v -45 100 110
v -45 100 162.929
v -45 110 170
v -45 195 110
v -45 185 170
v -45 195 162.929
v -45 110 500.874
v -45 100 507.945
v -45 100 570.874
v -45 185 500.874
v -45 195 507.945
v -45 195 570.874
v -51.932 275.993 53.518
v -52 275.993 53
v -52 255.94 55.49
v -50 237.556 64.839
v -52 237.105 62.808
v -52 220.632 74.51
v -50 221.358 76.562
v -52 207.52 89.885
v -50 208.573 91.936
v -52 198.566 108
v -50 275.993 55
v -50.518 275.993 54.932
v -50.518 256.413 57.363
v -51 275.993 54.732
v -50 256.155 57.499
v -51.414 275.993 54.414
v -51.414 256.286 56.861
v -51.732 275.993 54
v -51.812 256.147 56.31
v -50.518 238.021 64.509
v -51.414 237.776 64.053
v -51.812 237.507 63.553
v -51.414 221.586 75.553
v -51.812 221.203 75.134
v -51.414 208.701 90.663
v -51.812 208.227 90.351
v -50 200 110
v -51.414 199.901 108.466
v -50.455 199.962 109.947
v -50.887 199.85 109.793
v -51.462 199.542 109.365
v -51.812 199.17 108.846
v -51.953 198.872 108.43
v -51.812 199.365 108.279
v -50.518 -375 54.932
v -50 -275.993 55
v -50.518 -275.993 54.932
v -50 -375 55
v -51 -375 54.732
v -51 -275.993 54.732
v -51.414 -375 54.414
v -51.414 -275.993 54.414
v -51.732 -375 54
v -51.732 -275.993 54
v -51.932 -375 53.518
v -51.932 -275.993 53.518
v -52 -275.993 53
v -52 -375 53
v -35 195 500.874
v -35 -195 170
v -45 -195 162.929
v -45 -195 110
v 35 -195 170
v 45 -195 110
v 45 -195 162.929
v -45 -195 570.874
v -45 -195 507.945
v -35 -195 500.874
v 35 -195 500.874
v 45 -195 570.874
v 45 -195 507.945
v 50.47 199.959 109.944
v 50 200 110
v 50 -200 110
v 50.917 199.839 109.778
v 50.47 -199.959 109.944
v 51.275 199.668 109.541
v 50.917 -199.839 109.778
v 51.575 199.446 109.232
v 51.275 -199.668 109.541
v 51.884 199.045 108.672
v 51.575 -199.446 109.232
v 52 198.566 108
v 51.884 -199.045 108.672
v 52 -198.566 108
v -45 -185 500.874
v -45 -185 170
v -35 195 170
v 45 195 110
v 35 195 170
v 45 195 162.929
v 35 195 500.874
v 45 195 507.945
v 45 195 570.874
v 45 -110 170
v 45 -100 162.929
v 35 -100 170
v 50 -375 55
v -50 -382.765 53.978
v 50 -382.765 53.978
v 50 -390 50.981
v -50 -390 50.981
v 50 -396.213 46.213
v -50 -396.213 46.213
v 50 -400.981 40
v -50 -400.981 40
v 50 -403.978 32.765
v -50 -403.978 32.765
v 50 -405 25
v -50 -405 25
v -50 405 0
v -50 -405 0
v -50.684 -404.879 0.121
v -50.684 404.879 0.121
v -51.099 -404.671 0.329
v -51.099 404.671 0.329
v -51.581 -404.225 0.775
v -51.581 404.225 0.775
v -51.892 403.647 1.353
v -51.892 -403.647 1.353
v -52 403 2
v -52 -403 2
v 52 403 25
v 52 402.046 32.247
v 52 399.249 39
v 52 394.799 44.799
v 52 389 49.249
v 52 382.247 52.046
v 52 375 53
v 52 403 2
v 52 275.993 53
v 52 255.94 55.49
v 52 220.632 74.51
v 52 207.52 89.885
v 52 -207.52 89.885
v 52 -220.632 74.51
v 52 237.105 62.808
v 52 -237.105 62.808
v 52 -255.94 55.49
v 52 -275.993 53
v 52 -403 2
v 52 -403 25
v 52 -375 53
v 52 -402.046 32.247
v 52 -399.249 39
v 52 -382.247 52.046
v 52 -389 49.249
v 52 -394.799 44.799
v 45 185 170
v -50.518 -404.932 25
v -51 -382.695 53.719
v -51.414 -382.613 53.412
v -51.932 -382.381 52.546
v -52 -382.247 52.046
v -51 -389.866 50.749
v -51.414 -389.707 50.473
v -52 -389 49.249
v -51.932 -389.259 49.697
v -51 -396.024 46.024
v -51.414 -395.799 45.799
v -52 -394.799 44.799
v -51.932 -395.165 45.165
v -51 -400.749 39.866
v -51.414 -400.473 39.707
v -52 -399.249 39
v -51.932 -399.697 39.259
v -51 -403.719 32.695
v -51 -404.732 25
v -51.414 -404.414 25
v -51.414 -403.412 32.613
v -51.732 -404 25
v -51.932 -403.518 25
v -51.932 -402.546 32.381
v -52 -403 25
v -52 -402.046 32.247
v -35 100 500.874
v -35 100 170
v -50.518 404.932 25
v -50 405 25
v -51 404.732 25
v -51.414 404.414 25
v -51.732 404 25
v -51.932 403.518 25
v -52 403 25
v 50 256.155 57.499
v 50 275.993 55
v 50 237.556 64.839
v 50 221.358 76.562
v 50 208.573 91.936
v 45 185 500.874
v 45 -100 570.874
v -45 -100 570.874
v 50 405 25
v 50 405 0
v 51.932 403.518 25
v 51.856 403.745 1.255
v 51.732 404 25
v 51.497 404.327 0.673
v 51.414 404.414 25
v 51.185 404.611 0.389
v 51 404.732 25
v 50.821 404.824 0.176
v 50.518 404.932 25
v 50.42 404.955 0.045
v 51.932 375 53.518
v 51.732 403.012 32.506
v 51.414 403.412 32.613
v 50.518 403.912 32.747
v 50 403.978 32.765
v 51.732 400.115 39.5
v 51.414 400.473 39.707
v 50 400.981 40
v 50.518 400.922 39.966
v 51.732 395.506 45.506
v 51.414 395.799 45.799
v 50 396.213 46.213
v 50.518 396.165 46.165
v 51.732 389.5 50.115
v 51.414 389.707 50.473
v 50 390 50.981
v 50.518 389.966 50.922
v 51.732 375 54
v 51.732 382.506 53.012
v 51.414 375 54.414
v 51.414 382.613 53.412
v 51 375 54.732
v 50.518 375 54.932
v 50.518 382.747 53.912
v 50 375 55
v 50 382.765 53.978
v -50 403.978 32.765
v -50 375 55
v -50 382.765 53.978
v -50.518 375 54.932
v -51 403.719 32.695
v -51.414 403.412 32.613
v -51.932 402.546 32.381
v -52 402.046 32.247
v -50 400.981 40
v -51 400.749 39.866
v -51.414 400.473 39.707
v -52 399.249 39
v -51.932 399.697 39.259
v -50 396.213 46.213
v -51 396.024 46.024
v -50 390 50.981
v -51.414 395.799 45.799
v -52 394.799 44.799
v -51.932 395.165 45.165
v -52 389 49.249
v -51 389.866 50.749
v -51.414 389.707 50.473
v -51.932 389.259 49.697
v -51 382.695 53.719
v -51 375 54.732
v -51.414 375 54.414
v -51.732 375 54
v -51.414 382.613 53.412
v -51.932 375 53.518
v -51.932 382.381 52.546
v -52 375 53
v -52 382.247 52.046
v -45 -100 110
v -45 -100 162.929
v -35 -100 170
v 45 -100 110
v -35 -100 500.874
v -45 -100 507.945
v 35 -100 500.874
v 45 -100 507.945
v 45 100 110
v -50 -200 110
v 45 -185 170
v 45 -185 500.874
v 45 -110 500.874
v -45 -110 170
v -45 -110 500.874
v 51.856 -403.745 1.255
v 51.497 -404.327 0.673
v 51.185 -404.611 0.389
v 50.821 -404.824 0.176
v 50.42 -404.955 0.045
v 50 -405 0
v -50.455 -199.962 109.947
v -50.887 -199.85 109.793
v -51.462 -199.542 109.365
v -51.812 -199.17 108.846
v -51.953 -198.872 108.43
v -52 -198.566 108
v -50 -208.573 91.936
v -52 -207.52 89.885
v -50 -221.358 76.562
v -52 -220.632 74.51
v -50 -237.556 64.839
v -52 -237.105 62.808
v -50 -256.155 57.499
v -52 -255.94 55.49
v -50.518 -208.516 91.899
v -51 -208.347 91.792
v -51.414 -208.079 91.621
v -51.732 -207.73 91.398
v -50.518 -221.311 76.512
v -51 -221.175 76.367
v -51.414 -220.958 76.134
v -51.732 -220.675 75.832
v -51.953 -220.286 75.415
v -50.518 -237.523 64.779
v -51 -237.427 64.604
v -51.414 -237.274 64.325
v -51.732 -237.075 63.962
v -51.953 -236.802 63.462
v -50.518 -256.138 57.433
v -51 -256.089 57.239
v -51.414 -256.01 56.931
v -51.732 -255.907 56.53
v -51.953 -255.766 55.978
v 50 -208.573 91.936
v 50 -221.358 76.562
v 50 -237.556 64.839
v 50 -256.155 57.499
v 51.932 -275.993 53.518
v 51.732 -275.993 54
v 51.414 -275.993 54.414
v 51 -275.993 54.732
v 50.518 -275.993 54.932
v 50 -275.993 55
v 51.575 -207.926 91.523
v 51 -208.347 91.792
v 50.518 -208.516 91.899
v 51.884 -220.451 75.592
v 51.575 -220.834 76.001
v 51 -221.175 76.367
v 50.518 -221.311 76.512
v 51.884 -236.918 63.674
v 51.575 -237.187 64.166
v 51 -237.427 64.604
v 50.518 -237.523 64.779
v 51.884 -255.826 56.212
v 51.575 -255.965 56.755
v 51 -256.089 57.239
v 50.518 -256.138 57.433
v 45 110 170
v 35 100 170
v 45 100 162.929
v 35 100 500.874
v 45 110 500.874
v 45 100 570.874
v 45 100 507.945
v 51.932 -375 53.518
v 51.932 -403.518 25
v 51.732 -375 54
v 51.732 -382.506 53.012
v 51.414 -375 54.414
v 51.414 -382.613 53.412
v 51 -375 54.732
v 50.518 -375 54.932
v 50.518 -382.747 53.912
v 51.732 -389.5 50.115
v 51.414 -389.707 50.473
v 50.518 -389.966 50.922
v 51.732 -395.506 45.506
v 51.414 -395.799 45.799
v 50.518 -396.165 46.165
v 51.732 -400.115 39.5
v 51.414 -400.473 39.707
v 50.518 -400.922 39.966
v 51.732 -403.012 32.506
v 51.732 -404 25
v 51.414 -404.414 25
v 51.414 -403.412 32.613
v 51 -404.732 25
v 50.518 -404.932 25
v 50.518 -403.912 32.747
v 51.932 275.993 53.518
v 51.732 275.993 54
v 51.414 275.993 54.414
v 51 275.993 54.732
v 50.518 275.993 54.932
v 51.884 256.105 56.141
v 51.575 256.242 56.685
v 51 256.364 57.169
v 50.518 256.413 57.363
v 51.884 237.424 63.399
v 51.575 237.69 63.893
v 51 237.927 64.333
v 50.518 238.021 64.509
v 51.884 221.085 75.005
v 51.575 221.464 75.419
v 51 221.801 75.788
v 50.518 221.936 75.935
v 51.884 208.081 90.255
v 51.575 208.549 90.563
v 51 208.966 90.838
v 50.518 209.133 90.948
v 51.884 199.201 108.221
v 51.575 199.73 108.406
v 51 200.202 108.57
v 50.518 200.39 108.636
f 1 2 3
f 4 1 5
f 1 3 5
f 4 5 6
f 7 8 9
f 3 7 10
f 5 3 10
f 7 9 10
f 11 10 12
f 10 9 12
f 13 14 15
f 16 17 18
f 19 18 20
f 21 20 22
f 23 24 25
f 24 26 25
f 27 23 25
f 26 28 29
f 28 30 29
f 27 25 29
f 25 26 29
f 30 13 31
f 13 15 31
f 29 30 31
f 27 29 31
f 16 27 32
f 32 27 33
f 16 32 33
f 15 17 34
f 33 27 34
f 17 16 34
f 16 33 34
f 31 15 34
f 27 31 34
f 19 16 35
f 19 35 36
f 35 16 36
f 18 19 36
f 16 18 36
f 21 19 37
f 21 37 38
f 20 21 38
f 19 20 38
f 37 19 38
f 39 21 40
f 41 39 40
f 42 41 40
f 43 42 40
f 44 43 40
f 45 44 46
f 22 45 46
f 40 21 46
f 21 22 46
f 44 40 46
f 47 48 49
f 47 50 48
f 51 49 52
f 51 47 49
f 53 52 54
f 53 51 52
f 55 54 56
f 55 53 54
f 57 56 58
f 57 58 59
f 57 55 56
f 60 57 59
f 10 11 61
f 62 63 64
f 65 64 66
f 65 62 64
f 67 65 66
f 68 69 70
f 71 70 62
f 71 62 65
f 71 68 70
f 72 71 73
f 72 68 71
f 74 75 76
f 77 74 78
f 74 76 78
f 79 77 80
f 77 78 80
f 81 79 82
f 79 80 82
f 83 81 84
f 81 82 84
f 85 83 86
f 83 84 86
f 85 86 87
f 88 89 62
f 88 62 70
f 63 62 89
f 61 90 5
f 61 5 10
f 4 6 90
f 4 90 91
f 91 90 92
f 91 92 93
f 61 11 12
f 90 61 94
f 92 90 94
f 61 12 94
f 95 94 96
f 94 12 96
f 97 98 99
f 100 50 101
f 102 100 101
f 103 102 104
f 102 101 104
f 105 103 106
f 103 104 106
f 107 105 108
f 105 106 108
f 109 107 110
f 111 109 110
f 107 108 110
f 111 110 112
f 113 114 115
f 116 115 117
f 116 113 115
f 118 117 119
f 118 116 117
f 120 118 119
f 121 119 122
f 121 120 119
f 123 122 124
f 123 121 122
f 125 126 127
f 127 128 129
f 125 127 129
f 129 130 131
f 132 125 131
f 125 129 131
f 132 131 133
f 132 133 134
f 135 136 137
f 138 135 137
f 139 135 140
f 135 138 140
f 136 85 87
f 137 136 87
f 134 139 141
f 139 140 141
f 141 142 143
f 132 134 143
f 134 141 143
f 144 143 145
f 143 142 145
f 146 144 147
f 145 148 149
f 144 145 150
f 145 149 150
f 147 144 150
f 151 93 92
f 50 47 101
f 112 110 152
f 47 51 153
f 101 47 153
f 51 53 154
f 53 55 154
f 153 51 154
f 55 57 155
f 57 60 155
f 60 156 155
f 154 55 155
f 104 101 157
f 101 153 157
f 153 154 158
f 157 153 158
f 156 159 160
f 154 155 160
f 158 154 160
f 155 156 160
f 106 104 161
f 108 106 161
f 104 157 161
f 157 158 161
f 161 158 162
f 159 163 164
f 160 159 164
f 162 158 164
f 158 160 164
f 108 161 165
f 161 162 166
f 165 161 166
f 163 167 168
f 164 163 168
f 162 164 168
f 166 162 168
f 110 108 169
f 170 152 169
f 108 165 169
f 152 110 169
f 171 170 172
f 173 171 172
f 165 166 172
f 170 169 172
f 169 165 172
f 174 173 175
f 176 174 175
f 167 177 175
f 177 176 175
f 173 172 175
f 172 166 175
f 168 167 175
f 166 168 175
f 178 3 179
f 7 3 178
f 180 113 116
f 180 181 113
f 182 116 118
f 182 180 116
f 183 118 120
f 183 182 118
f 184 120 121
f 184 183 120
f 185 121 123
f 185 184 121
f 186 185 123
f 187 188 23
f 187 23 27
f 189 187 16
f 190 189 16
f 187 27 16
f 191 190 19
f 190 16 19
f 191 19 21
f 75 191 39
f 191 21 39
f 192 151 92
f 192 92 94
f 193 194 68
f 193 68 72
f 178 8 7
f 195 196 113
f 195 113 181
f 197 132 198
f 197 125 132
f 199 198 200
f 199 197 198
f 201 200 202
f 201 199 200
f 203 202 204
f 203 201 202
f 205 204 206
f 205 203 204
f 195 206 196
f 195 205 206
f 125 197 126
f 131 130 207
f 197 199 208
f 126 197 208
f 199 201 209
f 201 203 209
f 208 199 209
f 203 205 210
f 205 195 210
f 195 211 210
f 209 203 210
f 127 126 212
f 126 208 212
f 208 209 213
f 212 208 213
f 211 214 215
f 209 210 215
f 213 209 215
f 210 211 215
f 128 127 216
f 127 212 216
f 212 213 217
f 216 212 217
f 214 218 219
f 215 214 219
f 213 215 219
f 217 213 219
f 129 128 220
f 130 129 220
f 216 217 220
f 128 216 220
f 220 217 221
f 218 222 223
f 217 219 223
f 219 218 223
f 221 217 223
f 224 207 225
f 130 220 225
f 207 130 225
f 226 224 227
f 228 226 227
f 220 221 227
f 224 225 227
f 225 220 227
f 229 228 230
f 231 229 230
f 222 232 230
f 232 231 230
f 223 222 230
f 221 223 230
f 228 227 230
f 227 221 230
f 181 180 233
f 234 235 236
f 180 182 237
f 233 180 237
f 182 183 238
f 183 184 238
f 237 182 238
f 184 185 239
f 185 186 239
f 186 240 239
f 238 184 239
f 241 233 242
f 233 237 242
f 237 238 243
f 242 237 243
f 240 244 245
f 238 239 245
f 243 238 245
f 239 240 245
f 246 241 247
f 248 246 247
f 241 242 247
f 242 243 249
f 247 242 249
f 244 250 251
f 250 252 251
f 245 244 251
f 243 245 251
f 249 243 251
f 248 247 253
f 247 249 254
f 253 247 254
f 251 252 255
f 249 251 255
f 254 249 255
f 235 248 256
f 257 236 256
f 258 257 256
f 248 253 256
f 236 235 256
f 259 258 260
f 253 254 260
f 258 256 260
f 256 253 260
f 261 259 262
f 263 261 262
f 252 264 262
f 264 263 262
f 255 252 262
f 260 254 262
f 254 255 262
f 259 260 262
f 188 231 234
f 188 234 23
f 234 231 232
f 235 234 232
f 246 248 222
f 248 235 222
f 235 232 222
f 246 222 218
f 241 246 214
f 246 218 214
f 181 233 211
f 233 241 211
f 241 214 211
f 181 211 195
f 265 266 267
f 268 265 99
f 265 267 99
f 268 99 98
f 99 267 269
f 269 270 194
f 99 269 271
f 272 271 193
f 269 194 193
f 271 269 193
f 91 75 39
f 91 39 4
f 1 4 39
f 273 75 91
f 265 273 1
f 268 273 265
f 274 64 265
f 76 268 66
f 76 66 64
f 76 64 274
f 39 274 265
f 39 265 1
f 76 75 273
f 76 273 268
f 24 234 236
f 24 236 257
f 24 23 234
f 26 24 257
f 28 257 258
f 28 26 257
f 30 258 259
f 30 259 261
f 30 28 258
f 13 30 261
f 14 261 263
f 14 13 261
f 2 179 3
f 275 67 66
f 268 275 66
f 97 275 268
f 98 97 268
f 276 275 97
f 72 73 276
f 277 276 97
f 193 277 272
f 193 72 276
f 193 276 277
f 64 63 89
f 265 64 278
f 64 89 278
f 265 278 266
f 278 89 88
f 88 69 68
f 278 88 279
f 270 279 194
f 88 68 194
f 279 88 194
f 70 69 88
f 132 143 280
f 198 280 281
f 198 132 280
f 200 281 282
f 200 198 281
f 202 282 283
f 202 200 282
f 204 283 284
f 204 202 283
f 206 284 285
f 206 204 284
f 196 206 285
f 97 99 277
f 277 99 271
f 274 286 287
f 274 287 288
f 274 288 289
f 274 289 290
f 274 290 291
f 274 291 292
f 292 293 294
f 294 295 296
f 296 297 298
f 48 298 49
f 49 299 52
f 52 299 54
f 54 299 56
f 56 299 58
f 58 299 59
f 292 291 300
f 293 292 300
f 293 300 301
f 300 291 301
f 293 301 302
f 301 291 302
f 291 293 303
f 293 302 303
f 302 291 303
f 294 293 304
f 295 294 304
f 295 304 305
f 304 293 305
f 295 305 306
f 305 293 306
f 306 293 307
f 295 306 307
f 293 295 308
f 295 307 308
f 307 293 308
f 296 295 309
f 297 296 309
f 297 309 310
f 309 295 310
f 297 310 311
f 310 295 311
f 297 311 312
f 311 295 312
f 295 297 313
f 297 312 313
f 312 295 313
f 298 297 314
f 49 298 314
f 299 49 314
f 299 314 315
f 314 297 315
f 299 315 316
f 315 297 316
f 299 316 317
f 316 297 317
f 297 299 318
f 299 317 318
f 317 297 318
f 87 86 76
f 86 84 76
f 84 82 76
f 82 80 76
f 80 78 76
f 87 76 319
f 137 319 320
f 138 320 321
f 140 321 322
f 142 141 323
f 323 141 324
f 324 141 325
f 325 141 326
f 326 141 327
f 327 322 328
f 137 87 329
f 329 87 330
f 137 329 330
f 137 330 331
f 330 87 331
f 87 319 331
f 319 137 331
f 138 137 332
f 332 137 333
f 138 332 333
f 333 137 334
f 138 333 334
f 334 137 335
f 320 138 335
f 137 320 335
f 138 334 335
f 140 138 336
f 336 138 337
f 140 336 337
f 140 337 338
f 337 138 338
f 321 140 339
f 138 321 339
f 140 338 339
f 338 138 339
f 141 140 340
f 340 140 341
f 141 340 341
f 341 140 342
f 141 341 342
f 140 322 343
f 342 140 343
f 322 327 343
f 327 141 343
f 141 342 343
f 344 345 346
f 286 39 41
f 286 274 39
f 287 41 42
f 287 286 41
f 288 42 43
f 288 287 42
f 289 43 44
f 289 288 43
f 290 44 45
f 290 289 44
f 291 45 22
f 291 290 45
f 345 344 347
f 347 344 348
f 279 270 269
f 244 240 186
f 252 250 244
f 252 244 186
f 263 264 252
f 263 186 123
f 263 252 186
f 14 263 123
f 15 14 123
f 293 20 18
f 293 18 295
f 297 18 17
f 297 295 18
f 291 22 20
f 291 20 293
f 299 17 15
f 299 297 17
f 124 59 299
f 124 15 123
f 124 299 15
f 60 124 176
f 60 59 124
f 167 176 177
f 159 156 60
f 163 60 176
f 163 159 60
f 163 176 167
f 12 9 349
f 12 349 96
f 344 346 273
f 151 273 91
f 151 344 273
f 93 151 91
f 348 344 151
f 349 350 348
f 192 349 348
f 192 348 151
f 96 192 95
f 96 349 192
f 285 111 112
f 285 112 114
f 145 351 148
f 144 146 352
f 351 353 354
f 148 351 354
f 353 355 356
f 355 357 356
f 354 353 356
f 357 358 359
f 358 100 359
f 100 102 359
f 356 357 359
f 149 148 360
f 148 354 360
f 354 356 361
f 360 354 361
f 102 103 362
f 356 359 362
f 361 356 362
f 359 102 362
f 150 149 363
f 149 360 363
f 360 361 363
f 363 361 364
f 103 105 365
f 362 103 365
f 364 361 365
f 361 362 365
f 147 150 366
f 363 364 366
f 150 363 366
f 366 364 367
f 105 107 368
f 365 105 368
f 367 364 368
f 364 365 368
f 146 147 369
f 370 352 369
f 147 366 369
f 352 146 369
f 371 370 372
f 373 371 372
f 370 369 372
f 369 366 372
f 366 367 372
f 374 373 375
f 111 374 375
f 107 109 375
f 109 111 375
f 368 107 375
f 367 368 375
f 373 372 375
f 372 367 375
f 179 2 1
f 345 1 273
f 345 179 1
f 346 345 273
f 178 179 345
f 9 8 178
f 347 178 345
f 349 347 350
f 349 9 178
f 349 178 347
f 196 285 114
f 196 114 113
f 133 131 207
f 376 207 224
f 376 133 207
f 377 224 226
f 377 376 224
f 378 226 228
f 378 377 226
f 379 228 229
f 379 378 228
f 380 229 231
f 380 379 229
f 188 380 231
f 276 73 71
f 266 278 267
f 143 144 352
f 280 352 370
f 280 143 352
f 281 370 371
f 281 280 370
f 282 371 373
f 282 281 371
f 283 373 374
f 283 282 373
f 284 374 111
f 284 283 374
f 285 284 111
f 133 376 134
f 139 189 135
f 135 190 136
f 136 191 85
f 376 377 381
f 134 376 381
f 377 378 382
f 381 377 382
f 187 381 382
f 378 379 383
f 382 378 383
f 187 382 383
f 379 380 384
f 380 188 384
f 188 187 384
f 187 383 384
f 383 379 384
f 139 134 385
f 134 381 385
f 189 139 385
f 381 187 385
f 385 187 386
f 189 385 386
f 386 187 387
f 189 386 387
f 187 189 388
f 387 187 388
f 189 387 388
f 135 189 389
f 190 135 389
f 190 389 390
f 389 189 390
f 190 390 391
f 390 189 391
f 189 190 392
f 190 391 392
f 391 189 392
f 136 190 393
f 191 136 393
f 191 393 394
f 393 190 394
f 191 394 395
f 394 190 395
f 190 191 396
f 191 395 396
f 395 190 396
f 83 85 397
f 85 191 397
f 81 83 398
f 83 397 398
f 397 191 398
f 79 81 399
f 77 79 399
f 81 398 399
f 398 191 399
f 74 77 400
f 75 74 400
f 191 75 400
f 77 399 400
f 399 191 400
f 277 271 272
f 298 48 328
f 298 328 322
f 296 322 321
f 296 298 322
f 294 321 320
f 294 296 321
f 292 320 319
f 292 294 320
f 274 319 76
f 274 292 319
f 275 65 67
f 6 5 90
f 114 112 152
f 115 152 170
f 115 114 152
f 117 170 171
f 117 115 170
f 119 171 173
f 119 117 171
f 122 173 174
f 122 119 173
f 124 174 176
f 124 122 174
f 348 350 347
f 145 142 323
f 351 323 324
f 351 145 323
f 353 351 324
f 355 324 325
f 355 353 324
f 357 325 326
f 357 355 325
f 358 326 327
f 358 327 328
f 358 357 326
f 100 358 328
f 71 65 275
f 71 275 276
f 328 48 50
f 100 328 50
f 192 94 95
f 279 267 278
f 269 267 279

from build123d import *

# Parameters (mm, degrees)
F1_DEPTH      = 52
F1_DEPTH_BACK = 52
F0_W          = 95
F0_H          = 460.873763546
F2_DEPTH      = 45
F2_DEPTH_BACK = 45
F3_R          = 30
F4_T1_DEPTH   = 104
F5_T1_DEPTH   = 104
F6_SIZE       = 10
F7_W          = 90
F7_H          = 95
F8_DEPTH      = 50
F9_W          = 90
F9_H          = 95
F10_DEPTH     = 60
F11_T4_DEPTH  = 65.575795383
F11_T10_DEPTH = 65.575795383
F11_T16_DEPTH = 65.575795383
F11_T22_DEPTH = 65.575795383
F11_T28_DEPTH = 65.575795383
F11_T34_DEPTH = 65.575795383
F11_T40_DEPTH = 65.575795383
F11_T46_DEPTH = 65.575795383
F12_T4_DEPTH  = 65.575795383
F12_T10_DEPTH = 65.575795383
F12_T16_DEPTH = 65.575795383
F12_T22_DEPTH = 65.575795383
F12_T28_DEPTH = 65.575795383
F12_T34_DEPTH = 65.575795383
F12_T40_DEPTH = 65.575795383
F12_T46_DEPTH = 65.575795383
F13_R         = 2


# Not quite as in the source:
# - a fillet or chamfer that OpenCascade refuses, or shapes differently, is made with other operations: its cross-section is extruded or revolved along the edge and cut away or added


with BuildPart() as f1:
    # F0 (on Right) → F1 (new body, two sides)
    with BuildSketch(Plane.YZ) as f1_sk:
        Polygon((-405, 55), (-405, 0), (405, 0), (405, 55), (200, 55), (200, 110), (195, 110), (100, 110), (0, 110), (-100, 110), (-195, 110), (-200, 110), (-200, 55), align=None)
    extrude(amount=F1_DEPTH)
    extrude(f1_sk.sketch, amount=-F1_DEPTH_BACK)

    # F0 (on Right) → F2 (join, two sides)
    with BuildSketch(Plane.YZ) as f2_sk:
        with Locations((-147.5, 340.436881773)):
            Rectangle(F0_W, F0_H)
        with Locations((147.5, 340.436881773)):
            Rectangle(F0_W, F0_H)
    extrude(amount=-F2_DEPTH)
    extrude(f2_sk.sketch, amount=F2_DEPTH_BACK)

    # F3
    f3_edges = [f1.edges().sort_by_distance(p)[0] for p in [
        (0, 405, 55),
        (0, -405, 55),
    ]]
    fillet(f3_edges, radius=F3_R)

    # F4: fillet of radius 80 on 1 edges, made by hand

    # F4_s2 → F4_t1 (join)
    with BuildSketch(Plane.YZ.offset(-52)):
        with BuildLine():
            ThreePointArc((275.9934207679, 55), (229.0892631696, 70.1925930159), (200, 110))
            Line((200, 110), (200, 55))
            Line((200, 55), (275.9934207679, 55))
        make_face()
    extrude(amount=F4_T1_DEPTH)

    # F5: fillet of radius 80 on 1 edges, made by hand

    # F5_s2 → F5_t1 (join)
    with BuildSketch(Plane.YZ.offset(-52)):
        with BuildLine():
            ThreePointArc((-275.9934207679, 55), (-229.0892631696, 70.1925930159), (-200, 110))
            Line((-200, 110), (-200, 55))
            Line((-200, 55), (-275.9934207679, 55))
        make_face()
    extrude(amount=F5_T1_DEPTH)

    # F6
    f6_edges = [f1.edges().sort_by_distance(p)[0] for p in [
        (45, -195, 340.436882),
        (45, -100, 340.436882),
        (45, 100, 340.436882),
        (-45, -195, 340.436882),
        (-45, -100, 340.436882),
        (-45, 100, 340.436882),
        (-45, 195, 340.436882),
        (45, 195, 340.436882),
    ]]
    chamfer(f6_edges, length=F6_SIZE)

    # F7 (on face) → F8 (join)
    with BuildSketch(Plane.XY.offset(110)):
        with Locations((0, -147.5)):
            Rectangle(F7_W, F7_H)
        with Locations((0, 147.5)):
            Rectangle(F7_W, F7_H)
    extrude(amount=F8_DEPTH)

    # F9 (on face) → F10 (join)
    with BuildSketch(Plane.XY.offset(570.873763546)):
        Polygon((45, -110), (45, -100), (35, -100), align=None)
        Polygon((-45, -110), (-35, -100), (-45, -100), align=None)
        Polygon((45, -195), (45, -185), (35, -195), align=None)
        Polygon((-35, -195), (-45, -185), (-45, -195), align=None)
        with Locations((0, 147.5)):
            Rectangle(F9_W, F9_H)
        Polygon((45, -110), (35, -100), (-35, -100), (-45, -110), (-45, -185), (-35, -195), (35, -195), (45, -185), align=None)
    extrude(amount=-F10_DEPTH)

    # F11: chamfer of 10 on 8 edges, made by hand


with BuildPart() as f11_tool2:
    # F11_s3 → F11_t4 (new body)
    with BuildSketch(Plane(origin=(-98.1845447985, -98.1845447985, 0), x_dir=(0, 0, 1), z_dir=(0.7071067812, 0.7071067812, 0))):
        Polygon((510.873763546, 172.6345596729), (500.873763546, 162.6345596729), (510.873763546, 162.6345596729), align=None)
    extrude(amount=F11_T4_DEPTH)

    split(bisect_by=Plane.YZ.offset(45), keep=Keep.BOTTOM)

    split(bisect_by=Plane.XZ.offset(195), keep=Keep.BOTTOM)


with BuildPart() as f1_1:
    add(f1.part)

    # F11_t1: union F11_tool2
    add(f11_tool2.part)


with BuildPart() as f11_tool8:
    # F11_s9 → F11_t10 (new body)
    with BuildSketch(Plane(origin=(49.3154552015, -49.3154552015, 0), x_dir=(0, 0, 1), z_dir=(0.7071067812, -0.7071067812, 0))):
        Polygon((500.873763546, 45.9619407771), (510.873763546, 35.9619407771), (510.873763546, 45.9619407771), align=None)
    extrude(amount=F11_T10_DEPTH)

    split(bisect_by=Plane.YZ.offset(45), keep=Keep.BOTTOM)

    split(bisect_by=Plane.XZ.offset(100), keep=Keep.TOP)


with BuildPart() as f1_2:
    add(f1_1.part)

    # F11_t7: union F11_tool8
    add(f11_tool8.part)


with BuildPart() as f11_tool14:
    # F11_s15 → F11_t16 (new body)
    with BuildSketch(Plane(origin=(-95.6845447985, -95.6845447985, 0), x_dir=(0, 0, 1), z_dir=(0.7071067812, 0.7071067812, 0))):
        Polygon((510.873763546, 35.9619407771), (500.873763546, 45.9619407771), (510.873763546, 45.9619407771), align=None)
    extrude(amount=F11_T16_DEPTH)

    split(bisect_by=Plane.YZ.offset(-45), keep=Keep.TOP)

    split(bisect_by=Plane.XZ.offset(100), keep=Keep.TOP)


with BuildPart() as f1_3:
    add(f1_2.part)

    # F11_t13: union F11_tool14
    add(f11_tool14.part)


with BuildPart() as f11_tool20:
    # F11_s21 → F11_t22 (new body)
    with BuildSketch(Plane(origin=(98.1845447985, -98.1845447985, 0), x_dir=(0, 0, 1), z_dir=(-0.7071067812, 0.7071067812, 0))):
        Polygon((510.873763546, -172.6345596729), (500.873763546, -162.6345596729), (510.873763546, -162.6345596729), align=None)
    extrude(amount=F11_T22_DEPTH)

    split(bisect_by=Plane.XZ.offset(195), keep=Keep.BOTTOM)

    split(bisect_by=Plane.YZ.offset(-45), keep=Keep.TOP)


with BuildPart() as f1_4:
    add(f1_3.part)

    # F11_t19: union F11_tool20
    add(f11_tool20.part)


with BuildPart() as f11_tool26:
    # F11_s27 → F11_t28 (new body)
    with BuildSketch(Plane(origin=(-98.1845447985, 98.1845447985, 0), x_dir=(0, 0, 1), z_dir=(0.7071067812, -0.7071067812, 0))):
        Polygon((500.873763546, -162.6345596729), (510.873763546, -172.6345596729), (510.873763546, -162.6345596729), align=None)
    extrude(amount=F11_T28_DEPTH)

    split(bisect_by=Plane.YZ.offset(45), keep=Keep.BOTTOM)

    split(bisect_by=Plane.XZ.offset(-195), keep=Keep.TOP)


with BuildPart() as f1_5:
    add(f1_4.part)

    # F11_t25: union F11_tool26
    add(f11_tool26.part)


with BuildPart() as f11_tool32:
    # F11_s33 → F11_t34 (new body)
    with BuildSketch(Plane(origin=(49.3154552015, 49.3154552015, 0), x_dir=(0, 0, 1), z_dir=(0.7071067812, 0.7071067812, 0))):
        Polygon((510.873763546, -35.9619407771), (500.873763546, -45.9619407771), (510.873763546, -45.9619407771), align=None)
    extrude(amount=F11_T34_DEPTH)

    split(bisect_by=Plane.YZ.offset(45), keep=Keep.BOTTOM)

    split(bisect_by=Plane.XZ.offset(-100), keep=Keep.BOTTOM)


with BuildPart() as f1_6:
    add(f1_5.part)

    # F11_t31: union F11_tool32
    add(f11_tool32.part)


with BuildPart() as f11_tool38:
    # F11_s39 → F11_t40 (new body)
    with BuildSketch(Plane(origin=(-49.3154552015, 49.3154552015, 0), x_dir=(0, 0, 1), z_dir=(-0.7071067812, 0.7071067812, 0))):
        Polygon((510.873763546, 35.9619407771), (500.873763546, 45.9619407771), (510.873763546, 45.9619407771), align=None)
    extrude(amount=F11_T40_DEPTH)

    split(bisect_by=Plane.XZ.offset(-100), keep=Keep.BOTTOM)

    split(bisect_by=Plane.YZ.offset(-45), keep=Keep.TOP)


with BuildPart() as f1_7:
    add(f1_6.part)

    # F11_t37: union F11_tool38
    add(f11_tool38.part)


with BuildPart() as f11_tool44:
    # F11_s45 → F11_t46 (new body)
    with BuildSketch(Plane(origin=(51.8154552015, 51.8154552015, 0), x_dir=(0, 0, 1), z_dir=(0.7071067812, 0.7071067812, 0))):
        Polygon((510.873763546, -172.6345596729), (500.873763546, -162.6345596729), (510.873763546, -162.6345596729), align=None)
    extrude(amount=F11_T46_DEPTH)

    split(bisect_by=Plane.YZ.offset(-45), keep=Keep.TOP)

    split(bisect_by=Plane.XZ.offset(-195), keep=Keep.TOP)


with BuildPart() as f1_8:
    add(f1_7.part)

    # F11_t43: union F11_tool44
    add(f11_tool44.part)

    # F12: chamfer of 10 on 8 edges, made by hand


with BuildPart() as f12_tool2:
    # F12_s3 → F12_t4 (new body)
    with BuildSketch(Plane(origin=(51.8154552015, 51.8154552015, 0), x_dir=(0, 0, 1), z_dir=(0.7071067812, 0.7071067812, 0))):
        Polygon((170, -162.6345596729), (160, -172.6345596729), (160, -162.6345596729), align=None)
    extrude(amount=F12_T4_DEPTH)

    split(bisect_by=Plane.YZ.offset(-45), keep=Keep.TOP)

    split(bisect_by=Plane.XZ.offset(-195), keep=Keep.TOP)


with BuildPart() as f1_9:
    add(f1_8.part)

    # F12_t1: union F12_tool2
    add(f12_tool2.part)


with BuildPart() as f12_tool8:
    # F12_s9 → F12_t10 (new body)
    with BuildSketch(Plane(origin=(-98.1845447985, 98.1845447985, 0), x_dir=(0, 0, 1), z_dir=(0.7071067812, -0.7071067812, 0))):
        Polygon((160, -172.6345596729), (170, -162.6345596729), (160, -162.6345596729), align=None)
    extrude(amount=F12_T10_DEPTH)

    split(bisect_by=Plane.YZ.offset(45), keep=Keep.BOTTOM)

    split(bisect_by=Plane.XZ.offset(-195), keep=Keep.TOP)


with BuildPart() as f1_10:
    add(f1_9.part)

    # F12_t7: union F12_tool8
    add(f12_tool8.part)


with BuildPart() as f12_tool14:
    # F12_s15 → F12_t16 (new body)
    with BuildSketch(Plane(origin=(49.3154552015, 49.3154552015, 0), x_dir=(0, 0, 1), z_dir=(0.7071067812, 0.7071067812, 0))):
        Polygon((170, -45.9619407771), (160, -35.9619407771), (160, -45.9619407771), align=None)
    extrude(amount=F12_T16_DEPTH)

    split(bisect_by=Plane.YZ.offset(45), keep=Keep.BOTTOM)

    split(bisect_by=Plane.XZ.offset(-100), keep=Keep.BOTTOM)


with BuildPart() as f1_11:
    add(f1_10.part)

    # F12_t13: union F12_tool14
    add(f12_tool14.part)


with BuildPart() as f12_tool20:
    # F12_s21 → F12_t22 (new body)
    with BuildSketch(Plane(origin=(-98.1845447985, -98.1845447985, 0), x_dir=(0, 0, 1), z_dir=(0.7071067812, 0.7071067812, 0))):
        Polygon((170, 162.6345596729), (160, 172.6345596729), (160, 162.6345596729), align=None)
    extrude(amount=F12_T22_DEPTH)

    split(bisect_by=Plane.YZ.offset(45), keep=Keep.BOTTOM)

    split(bisect_by=Plane.XZ.offset(195), keep=Keep.BOTTOM)


with BuildPart() as f1_12:
    add(f1_11.part)

    # F12_t19: union F12_tool20
    add(f12_tool20.part)


with BuildPart() as f12_tool26:
    # F12_s27 → F12_t28 (new body)
    with BuildSketch(Plane(origin=(49.3154552015, -49.3154552015, 0), x_dir=(0, 0, 1), z_dir=(0.7071067812, -0.7071067812, 0))):
        Polygon((160, 35.9619407771), (170, 45.9619407771), (160, 45.9619407771), align=None)
    extrude(amount=F12_T28_DEPTH)

    split(bisect_by=Plane.YZ.offset(45), keep=Keep.BOTTOM)

    split(bisect_by=Plane.XZ.offset(100), keep=Keep.TOP)


with BuildPart() as f1_13:
    add(f1_12.part)

    # F12_t25: union F12_tool26
    add(f12_tool26.part)


with BuildPart() as f12_tool32:
    # F12_s33 → F12_t34 (new body)
    with BuildSketch(Plane(origin=(-95.6845447985, -95.6845447985, 0), x_dir=(0, 0, 1), z_dir=(0.7071067812, 0.7071067812, 0))):
        Polygon((170, 45.9619407771), (160, 35.9619407771), (160, 45.9619407771), align=None)
    extrude(amount=F12_T34_DEPTH)

    split(bisect_by=Plane.YZ.offset(-45), keep=Keep.TOP)

    split(bisect_by=Plane.XZ.offset(100), keep=Keep.TOP)


with BuildPart() as f1_14:
    add(f1_13.part)

    # F12_t31: union F12_tool32
    add(f12_tool32.part)


with BuildPart() as f12_tool38:
    # F12_s39 → F12_t40 (new body)
    with BuildSketch(Plane(origin=(-49.3154552015, 49.3154552015, 0), x_dir=(0, 0, 1), z_dir=(-0.7071067812, 0.7071067812, 0))):
        Polygon((170, 45.9619407771), (160, 35.9619407771), (160, 45.9619407771), align=None)
    extrude(amount=F12_T40_DEPTH)

    split(bisect_by=Plane.XZ.offset(-100), keep=Keep.BOTTOM)

    split(bisect_by=Plane.YZ.offset(-45), keep=Keep.TOP)


with BuildPart() as f1_15:
    add(f1_14.part)

    # F12_t37: union F12_tool38
    add(f12_tool38.part)


with BuildPart() as f12_tool44:
    # F12_s45 → F12_t46 (new body)
    with BuildSketch(Plane(origin=(98.1845447985, -98.1845447985, 0), x_dir=(0, 0, 1), z_dir=(-0.7071067812, 0.7071067812, 0))):
        Polygon((170, -162.6345596729), (160, -172.6345596729), (160, -162.6345596729), align=None)
    extrude(amount=F12_T46_DEPTH)

    split(bisect_by=Plane.XZ.offset(195), keep=Keep.BOTTOM)

    split(bisect_by=Plane.YZ.offset(-45), keep=Keep.TOP)


with BuildPart() as f1_16:
    add(f1_15.part)

    # F12_t43: union F12_tool44
    add(f12_tool44.part)

    # F13
    f13_edges = [f1_16.edges().sort_by_distance(p)[0] for p in [
        (52, -405, 12.5),
        (52, 0, 0),
        (52, 405, 12.5),
        (52, 396.213203, 46.213203),
        (52, 325.49671, 55),
        (52, 229.089263, 70.192593),
        (52, 0, 110),
        (52, -229.089263, 70.192593),
        (52, -325.49671, 55),
        (52, -396.213203, 46.213203),
        (-52, -405, 12.5),
        (-52, 0, 0),
        (-52, 405, 12.5),
        (-52, 396.213203, 46.213203),
        (-52, 325.49671, 55),
        (-52, 229.089263, 70.192593),
        (-52, 0, 110),
        (-52, -229.089263, 70.192593),
        (-52, -325.49671, 55),
        (-52, -396.213203, 46.213203),
    ]]
    fillet(f13_edges, radius=F13_R)


solid = f1_16.part
